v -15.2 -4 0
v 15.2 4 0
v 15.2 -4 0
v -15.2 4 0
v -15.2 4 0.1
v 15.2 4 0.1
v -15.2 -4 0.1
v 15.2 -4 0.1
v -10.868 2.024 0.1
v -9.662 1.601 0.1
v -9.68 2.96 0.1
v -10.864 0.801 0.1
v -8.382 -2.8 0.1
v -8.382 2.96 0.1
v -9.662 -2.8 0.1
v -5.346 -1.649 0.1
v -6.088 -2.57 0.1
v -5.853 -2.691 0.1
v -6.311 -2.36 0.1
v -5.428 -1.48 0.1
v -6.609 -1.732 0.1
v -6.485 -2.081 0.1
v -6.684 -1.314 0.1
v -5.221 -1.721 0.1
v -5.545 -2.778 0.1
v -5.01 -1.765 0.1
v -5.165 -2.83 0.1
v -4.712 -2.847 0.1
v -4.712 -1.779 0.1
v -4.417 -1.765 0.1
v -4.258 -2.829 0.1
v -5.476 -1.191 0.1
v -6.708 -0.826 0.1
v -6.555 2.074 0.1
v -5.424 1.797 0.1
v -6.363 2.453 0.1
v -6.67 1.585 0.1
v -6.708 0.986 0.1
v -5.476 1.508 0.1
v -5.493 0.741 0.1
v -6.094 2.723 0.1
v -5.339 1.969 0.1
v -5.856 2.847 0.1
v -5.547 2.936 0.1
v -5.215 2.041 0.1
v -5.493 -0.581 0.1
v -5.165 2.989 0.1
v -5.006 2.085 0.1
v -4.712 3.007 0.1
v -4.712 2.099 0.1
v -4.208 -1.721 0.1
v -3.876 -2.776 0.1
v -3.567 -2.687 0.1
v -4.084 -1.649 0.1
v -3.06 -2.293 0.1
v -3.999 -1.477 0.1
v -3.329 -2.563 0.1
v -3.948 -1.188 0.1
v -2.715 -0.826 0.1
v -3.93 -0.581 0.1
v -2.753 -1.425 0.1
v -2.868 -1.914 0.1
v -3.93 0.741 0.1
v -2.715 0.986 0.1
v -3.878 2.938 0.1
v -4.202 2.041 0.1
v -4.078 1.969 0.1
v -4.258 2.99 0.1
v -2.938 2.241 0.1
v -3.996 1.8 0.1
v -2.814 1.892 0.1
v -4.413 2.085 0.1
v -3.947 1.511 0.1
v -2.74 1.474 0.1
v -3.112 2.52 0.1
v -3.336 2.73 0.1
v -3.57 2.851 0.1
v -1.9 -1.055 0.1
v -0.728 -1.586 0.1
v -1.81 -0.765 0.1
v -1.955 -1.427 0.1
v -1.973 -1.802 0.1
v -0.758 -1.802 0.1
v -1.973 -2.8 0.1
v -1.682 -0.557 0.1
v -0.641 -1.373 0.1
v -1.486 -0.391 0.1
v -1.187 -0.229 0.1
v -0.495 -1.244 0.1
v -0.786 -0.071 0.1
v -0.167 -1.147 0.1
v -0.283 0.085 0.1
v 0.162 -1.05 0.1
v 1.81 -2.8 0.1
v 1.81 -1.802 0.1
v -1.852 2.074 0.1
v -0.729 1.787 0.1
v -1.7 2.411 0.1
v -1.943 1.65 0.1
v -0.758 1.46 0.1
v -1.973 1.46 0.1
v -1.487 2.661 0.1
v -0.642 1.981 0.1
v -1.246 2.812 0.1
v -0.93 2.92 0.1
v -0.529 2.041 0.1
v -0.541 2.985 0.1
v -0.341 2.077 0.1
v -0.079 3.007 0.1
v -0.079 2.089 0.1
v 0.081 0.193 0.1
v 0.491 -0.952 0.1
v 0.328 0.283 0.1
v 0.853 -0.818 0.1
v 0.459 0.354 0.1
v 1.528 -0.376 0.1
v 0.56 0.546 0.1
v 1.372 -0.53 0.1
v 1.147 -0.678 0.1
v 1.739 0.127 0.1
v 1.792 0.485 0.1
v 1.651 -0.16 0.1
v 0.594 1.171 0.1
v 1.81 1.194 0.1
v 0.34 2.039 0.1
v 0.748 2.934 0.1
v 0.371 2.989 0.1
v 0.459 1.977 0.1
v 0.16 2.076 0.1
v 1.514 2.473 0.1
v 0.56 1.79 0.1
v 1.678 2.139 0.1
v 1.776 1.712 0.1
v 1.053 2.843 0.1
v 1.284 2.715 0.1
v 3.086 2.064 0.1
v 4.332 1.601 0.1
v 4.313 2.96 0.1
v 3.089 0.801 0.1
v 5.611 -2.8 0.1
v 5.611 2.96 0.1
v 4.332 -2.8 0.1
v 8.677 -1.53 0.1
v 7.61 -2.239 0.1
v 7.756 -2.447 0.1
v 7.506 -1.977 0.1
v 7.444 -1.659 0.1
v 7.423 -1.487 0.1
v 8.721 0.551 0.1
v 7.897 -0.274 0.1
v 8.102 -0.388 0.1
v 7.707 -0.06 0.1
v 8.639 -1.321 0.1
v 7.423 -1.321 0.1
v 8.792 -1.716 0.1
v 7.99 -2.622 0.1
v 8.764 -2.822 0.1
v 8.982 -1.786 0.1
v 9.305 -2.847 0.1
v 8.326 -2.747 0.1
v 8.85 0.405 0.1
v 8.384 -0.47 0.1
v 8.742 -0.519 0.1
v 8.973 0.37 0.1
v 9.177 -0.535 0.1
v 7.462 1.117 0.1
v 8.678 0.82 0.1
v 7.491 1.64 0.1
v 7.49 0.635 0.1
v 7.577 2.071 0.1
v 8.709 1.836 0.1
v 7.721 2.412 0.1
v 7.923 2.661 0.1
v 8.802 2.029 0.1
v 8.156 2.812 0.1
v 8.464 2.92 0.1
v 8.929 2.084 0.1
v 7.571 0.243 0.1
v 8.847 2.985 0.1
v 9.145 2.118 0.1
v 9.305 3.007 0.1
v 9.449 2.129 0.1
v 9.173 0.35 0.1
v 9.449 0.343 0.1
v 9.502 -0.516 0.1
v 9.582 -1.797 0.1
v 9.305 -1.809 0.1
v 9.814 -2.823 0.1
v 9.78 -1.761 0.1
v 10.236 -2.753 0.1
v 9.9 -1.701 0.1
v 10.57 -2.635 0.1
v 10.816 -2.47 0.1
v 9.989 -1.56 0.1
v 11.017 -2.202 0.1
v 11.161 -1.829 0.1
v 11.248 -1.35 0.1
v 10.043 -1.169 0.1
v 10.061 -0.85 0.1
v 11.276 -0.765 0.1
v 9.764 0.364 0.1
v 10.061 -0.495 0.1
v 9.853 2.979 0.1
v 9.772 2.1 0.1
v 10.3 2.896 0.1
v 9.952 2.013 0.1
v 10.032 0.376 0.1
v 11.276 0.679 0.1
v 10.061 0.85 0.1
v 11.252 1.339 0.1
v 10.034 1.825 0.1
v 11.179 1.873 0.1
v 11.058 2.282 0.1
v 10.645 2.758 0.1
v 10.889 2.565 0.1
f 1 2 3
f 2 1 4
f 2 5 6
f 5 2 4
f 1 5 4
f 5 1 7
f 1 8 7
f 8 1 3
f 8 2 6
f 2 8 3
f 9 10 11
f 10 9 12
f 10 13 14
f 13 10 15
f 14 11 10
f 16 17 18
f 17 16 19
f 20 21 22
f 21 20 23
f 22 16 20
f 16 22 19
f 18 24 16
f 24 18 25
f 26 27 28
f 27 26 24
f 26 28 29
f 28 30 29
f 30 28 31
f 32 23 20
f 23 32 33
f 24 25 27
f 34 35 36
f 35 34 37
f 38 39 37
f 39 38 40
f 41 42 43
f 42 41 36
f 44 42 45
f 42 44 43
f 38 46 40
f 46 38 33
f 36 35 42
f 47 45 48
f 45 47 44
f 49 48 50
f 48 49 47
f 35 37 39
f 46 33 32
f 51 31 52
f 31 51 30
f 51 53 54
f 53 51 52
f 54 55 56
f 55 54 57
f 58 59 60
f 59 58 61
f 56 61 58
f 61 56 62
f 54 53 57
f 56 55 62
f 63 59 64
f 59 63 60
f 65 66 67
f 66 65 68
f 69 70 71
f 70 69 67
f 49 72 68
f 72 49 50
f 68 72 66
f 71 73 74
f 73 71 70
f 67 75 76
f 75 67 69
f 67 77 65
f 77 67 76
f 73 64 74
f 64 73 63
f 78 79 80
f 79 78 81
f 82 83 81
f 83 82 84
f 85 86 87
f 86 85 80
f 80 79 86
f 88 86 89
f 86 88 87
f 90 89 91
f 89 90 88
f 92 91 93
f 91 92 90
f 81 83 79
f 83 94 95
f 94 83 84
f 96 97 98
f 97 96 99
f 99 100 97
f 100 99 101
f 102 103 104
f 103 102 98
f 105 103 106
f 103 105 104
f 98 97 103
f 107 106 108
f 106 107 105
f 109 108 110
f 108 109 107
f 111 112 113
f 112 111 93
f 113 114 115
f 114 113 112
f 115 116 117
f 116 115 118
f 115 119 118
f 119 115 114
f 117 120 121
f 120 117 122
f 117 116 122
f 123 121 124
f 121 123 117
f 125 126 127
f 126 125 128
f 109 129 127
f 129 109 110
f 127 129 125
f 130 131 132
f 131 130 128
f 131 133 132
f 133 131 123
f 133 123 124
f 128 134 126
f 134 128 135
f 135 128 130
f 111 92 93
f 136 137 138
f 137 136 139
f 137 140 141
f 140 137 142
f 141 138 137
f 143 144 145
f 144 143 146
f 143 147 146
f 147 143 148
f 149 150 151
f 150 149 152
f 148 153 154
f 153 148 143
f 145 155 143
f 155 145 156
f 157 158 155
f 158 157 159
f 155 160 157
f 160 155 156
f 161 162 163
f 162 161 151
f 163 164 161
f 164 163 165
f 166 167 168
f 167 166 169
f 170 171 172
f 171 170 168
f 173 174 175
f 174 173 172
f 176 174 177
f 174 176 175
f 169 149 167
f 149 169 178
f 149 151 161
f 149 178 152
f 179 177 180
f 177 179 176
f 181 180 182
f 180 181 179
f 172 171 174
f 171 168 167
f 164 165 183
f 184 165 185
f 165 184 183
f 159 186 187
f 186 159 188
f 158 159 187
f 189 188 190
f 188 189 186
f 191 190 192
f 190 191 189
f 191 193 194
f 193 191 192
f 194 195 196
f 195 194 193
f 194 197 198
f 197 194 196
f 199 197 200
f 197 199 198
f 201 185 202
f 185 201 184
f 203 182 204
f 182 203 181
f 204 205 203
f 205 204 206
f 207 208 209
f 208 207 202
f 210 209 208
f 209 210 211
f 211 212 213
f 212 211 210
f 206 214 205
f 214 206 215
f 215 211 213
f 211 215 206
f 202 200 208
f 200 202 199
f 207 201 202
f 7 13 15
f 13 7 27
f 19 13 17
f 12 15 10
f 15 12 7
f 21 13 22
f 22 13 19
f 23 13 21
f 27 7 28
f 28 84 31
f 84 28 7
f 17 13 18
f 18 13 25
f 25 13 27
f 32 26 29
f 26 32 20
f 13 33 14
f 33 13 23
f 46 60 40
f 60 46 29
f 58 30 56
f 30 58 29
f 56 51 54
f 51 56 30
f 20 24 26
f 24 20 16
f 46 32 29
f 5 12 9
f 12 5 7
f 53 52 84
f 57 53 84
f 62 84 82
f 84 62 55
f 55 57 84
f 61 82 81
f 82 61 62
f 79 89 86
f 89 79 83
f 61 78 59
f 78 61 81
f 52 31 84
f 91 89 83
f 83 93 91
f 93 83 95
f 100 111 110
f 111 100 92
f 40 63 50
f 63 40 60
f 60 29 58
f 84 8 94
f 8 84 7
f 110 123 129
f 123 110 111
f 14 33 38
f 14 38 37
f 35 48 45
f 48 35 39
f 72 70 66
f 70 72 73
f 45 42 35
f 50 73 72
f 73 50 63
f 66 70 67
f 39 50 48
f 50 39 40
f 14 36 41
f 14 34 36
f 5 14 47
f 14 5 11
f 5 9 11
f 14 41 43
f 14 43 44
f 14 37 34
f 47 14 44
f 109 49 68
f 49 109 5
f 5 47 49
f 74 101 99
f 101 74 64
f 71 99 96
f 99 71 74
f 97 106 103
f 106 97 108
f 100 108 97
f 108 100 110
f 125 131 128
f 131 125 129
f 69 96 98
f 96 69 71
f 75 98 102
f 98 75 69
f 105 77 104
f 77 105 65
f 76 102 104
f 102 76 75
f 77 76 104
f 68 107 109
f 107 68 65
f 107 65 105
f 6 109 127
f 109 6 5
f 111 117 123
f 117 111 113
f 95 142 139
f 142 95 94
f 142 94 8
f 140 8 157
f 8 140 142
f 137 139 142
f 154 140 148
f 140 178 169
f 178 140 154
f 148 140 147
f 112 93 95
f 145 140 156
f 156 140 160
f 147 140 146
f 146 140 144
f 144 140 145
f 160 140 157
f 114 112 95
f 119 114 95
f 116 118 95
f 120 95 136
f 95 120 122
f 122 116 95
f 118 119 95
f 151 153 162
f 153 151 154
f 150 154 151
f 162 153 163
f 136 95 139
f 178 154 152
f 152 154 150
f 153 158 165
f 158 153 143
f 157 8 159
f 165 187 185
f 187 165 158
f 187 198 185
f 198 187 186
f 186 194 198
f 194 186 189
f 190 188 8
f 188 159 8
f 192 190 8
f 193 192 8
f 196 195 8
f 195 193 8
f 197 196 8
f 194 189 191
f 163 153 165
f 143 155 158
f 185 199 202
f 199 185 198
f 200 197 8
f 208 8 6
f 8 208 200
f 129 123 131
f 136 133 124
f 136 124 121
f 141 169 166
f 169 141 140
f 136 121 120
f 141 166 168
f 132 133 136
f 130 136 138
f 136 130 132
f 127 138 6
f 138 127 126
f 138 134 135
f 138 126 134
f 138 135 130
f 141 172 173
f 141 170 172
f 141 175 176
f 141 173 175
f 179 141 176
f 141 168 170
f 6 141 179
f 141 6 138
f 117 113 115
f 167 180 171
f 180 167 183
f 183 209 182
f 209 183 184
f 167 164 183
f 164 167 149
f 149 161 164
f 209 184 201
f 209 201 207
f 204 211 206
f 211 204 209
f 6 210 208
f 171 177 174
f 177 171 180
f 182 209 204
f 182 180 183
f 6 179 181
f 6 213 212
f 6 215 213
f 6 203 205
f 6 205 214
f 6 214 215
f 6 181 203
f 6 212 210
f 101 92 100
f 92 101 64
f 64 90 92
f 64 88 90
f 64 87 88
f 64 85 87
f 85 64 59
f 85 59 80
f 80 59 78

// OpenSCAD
// file: ../p/box5-12.scad
use <../lib.scad>
function ldraw_lib__box5_12() = [
// 0 Box with 5 Faces without Any Edges
// 0 Name: box5-12.dat
// 0 Author: Chris Dee [cwdee]
// 0 !LDRAW_ORG Primitive UPDATE 2009-02
// 0 !LICENSE Licensed under CC BY 4.0 : see CAreadme.txt
// 
// 0 BFC CERTIFY CCW
  [0,"BFC","CERTIFY"],
  [0,"BFC","CCW"],
// 
// 0 !HISTORY 2009-09-03 [PTadmin] Official Update 2009-02
// 
// 
// 4 16 1 1 1 1 1 -1 -1 1 -1 -1 1 1
  [4,16,1,1,1,1,1,-1,-1,1,-1,-1,1,1],
// 4 16 -1 0 1 1 0 1 1 1 1 -1 1 1
  [4,16,-1,0,1,1,0,1,1,1,1,-1,1,1],
// 4 16 -1 0 -1 -1 0 1 -1 1 1 -1 1 -1
  [4,16,-1,0,-1,-1,0,1,-1,1,1,-1,1,-1],
// 4 16 1 0 -1 -1 0 -1 -1 1 -1 1 1 -1
  [4,16,1,0,-1,-1,0,-1,-1,1,-1,1,1,-1],
// 4 16 1 0 1 1 0 -1 1 1 -1 1 1 1
  [4,16,1,0,1,1,0,-1,1,1,-1,1,1,1],
// 0
];
module ldraw_lib__box5_12(step=0, col=false, unit=2/5, alt=false, line=0.2, solid=!$preview)
    makepoly(ldraw_lib__box5_12(), step=step, col=col, unit=unit, alt=alt, line=line, solid=solid);
ldraw_lib__box5_12(line=0.2);
// main file
use <../lib.scad>
use <../p/box5-12.scad>
use <s/4616559ps6.scad>
use <s/4616559ps7.scad>
function ldraw_lib__4616559p() = [
// 0 Sticker  1 x  3.8 with White "10219"
// 0 Name: 4616559p.dat
// 0 Author: J.C. Tchang [tchang]
// 0 !LDRAW_ORG Part UPDATE 2013-02
// 0 !LICENSE Licensed under CC BY 4.0 : see CAreadme.txt
// 
// 0 BFC CERTIFY CCW
  [0,"BFC","CERTIFY"],
  [0,"BFC","CCW"],
// 
// 0 !KEYWORDS Set 10219
// 
// 0 !HISTORY 2013-12-23 [PTadmin] Official Update 2013-02
// 
// 
// 1 16 0 -0.25 0 38 0 0 0 0.25 0 0 0 10 box5-12.dat
  [1,16,0,-0.25,0,38,0,0,0,0.25,0,0,0,10, ldraw_lib__box5_12()],
// 0 //
// 1 15 0 -0.25 0 1 0 0 0 1 0 0 0 1 s\4616559ps6.dat
  [1,15,0,-0.25,0,1,0,0,0,1,0,0,0,1, ldraw_lib__s__4616559ps6()],
// 1 16 0 -0.25 0 1 0 0 0 1 0 0 0 1 s\4616559ps7.dat
  [1,16,0,-0.25,0,1,0,0,0,1,0,0,0,1, ldraw_lib__s__4616559ps7()],
];
module ldraw_lib__4616559p(step=0, col=false, unit=2/5, alt=false, line=0.2, solid=!$preview)
    makepoly(ldraw_lib__4616559p(), step=step, col=col, unit=unit, alt=alt, line=line, solid=solid);
ldraw_lib__4616559p(line=0.2);
